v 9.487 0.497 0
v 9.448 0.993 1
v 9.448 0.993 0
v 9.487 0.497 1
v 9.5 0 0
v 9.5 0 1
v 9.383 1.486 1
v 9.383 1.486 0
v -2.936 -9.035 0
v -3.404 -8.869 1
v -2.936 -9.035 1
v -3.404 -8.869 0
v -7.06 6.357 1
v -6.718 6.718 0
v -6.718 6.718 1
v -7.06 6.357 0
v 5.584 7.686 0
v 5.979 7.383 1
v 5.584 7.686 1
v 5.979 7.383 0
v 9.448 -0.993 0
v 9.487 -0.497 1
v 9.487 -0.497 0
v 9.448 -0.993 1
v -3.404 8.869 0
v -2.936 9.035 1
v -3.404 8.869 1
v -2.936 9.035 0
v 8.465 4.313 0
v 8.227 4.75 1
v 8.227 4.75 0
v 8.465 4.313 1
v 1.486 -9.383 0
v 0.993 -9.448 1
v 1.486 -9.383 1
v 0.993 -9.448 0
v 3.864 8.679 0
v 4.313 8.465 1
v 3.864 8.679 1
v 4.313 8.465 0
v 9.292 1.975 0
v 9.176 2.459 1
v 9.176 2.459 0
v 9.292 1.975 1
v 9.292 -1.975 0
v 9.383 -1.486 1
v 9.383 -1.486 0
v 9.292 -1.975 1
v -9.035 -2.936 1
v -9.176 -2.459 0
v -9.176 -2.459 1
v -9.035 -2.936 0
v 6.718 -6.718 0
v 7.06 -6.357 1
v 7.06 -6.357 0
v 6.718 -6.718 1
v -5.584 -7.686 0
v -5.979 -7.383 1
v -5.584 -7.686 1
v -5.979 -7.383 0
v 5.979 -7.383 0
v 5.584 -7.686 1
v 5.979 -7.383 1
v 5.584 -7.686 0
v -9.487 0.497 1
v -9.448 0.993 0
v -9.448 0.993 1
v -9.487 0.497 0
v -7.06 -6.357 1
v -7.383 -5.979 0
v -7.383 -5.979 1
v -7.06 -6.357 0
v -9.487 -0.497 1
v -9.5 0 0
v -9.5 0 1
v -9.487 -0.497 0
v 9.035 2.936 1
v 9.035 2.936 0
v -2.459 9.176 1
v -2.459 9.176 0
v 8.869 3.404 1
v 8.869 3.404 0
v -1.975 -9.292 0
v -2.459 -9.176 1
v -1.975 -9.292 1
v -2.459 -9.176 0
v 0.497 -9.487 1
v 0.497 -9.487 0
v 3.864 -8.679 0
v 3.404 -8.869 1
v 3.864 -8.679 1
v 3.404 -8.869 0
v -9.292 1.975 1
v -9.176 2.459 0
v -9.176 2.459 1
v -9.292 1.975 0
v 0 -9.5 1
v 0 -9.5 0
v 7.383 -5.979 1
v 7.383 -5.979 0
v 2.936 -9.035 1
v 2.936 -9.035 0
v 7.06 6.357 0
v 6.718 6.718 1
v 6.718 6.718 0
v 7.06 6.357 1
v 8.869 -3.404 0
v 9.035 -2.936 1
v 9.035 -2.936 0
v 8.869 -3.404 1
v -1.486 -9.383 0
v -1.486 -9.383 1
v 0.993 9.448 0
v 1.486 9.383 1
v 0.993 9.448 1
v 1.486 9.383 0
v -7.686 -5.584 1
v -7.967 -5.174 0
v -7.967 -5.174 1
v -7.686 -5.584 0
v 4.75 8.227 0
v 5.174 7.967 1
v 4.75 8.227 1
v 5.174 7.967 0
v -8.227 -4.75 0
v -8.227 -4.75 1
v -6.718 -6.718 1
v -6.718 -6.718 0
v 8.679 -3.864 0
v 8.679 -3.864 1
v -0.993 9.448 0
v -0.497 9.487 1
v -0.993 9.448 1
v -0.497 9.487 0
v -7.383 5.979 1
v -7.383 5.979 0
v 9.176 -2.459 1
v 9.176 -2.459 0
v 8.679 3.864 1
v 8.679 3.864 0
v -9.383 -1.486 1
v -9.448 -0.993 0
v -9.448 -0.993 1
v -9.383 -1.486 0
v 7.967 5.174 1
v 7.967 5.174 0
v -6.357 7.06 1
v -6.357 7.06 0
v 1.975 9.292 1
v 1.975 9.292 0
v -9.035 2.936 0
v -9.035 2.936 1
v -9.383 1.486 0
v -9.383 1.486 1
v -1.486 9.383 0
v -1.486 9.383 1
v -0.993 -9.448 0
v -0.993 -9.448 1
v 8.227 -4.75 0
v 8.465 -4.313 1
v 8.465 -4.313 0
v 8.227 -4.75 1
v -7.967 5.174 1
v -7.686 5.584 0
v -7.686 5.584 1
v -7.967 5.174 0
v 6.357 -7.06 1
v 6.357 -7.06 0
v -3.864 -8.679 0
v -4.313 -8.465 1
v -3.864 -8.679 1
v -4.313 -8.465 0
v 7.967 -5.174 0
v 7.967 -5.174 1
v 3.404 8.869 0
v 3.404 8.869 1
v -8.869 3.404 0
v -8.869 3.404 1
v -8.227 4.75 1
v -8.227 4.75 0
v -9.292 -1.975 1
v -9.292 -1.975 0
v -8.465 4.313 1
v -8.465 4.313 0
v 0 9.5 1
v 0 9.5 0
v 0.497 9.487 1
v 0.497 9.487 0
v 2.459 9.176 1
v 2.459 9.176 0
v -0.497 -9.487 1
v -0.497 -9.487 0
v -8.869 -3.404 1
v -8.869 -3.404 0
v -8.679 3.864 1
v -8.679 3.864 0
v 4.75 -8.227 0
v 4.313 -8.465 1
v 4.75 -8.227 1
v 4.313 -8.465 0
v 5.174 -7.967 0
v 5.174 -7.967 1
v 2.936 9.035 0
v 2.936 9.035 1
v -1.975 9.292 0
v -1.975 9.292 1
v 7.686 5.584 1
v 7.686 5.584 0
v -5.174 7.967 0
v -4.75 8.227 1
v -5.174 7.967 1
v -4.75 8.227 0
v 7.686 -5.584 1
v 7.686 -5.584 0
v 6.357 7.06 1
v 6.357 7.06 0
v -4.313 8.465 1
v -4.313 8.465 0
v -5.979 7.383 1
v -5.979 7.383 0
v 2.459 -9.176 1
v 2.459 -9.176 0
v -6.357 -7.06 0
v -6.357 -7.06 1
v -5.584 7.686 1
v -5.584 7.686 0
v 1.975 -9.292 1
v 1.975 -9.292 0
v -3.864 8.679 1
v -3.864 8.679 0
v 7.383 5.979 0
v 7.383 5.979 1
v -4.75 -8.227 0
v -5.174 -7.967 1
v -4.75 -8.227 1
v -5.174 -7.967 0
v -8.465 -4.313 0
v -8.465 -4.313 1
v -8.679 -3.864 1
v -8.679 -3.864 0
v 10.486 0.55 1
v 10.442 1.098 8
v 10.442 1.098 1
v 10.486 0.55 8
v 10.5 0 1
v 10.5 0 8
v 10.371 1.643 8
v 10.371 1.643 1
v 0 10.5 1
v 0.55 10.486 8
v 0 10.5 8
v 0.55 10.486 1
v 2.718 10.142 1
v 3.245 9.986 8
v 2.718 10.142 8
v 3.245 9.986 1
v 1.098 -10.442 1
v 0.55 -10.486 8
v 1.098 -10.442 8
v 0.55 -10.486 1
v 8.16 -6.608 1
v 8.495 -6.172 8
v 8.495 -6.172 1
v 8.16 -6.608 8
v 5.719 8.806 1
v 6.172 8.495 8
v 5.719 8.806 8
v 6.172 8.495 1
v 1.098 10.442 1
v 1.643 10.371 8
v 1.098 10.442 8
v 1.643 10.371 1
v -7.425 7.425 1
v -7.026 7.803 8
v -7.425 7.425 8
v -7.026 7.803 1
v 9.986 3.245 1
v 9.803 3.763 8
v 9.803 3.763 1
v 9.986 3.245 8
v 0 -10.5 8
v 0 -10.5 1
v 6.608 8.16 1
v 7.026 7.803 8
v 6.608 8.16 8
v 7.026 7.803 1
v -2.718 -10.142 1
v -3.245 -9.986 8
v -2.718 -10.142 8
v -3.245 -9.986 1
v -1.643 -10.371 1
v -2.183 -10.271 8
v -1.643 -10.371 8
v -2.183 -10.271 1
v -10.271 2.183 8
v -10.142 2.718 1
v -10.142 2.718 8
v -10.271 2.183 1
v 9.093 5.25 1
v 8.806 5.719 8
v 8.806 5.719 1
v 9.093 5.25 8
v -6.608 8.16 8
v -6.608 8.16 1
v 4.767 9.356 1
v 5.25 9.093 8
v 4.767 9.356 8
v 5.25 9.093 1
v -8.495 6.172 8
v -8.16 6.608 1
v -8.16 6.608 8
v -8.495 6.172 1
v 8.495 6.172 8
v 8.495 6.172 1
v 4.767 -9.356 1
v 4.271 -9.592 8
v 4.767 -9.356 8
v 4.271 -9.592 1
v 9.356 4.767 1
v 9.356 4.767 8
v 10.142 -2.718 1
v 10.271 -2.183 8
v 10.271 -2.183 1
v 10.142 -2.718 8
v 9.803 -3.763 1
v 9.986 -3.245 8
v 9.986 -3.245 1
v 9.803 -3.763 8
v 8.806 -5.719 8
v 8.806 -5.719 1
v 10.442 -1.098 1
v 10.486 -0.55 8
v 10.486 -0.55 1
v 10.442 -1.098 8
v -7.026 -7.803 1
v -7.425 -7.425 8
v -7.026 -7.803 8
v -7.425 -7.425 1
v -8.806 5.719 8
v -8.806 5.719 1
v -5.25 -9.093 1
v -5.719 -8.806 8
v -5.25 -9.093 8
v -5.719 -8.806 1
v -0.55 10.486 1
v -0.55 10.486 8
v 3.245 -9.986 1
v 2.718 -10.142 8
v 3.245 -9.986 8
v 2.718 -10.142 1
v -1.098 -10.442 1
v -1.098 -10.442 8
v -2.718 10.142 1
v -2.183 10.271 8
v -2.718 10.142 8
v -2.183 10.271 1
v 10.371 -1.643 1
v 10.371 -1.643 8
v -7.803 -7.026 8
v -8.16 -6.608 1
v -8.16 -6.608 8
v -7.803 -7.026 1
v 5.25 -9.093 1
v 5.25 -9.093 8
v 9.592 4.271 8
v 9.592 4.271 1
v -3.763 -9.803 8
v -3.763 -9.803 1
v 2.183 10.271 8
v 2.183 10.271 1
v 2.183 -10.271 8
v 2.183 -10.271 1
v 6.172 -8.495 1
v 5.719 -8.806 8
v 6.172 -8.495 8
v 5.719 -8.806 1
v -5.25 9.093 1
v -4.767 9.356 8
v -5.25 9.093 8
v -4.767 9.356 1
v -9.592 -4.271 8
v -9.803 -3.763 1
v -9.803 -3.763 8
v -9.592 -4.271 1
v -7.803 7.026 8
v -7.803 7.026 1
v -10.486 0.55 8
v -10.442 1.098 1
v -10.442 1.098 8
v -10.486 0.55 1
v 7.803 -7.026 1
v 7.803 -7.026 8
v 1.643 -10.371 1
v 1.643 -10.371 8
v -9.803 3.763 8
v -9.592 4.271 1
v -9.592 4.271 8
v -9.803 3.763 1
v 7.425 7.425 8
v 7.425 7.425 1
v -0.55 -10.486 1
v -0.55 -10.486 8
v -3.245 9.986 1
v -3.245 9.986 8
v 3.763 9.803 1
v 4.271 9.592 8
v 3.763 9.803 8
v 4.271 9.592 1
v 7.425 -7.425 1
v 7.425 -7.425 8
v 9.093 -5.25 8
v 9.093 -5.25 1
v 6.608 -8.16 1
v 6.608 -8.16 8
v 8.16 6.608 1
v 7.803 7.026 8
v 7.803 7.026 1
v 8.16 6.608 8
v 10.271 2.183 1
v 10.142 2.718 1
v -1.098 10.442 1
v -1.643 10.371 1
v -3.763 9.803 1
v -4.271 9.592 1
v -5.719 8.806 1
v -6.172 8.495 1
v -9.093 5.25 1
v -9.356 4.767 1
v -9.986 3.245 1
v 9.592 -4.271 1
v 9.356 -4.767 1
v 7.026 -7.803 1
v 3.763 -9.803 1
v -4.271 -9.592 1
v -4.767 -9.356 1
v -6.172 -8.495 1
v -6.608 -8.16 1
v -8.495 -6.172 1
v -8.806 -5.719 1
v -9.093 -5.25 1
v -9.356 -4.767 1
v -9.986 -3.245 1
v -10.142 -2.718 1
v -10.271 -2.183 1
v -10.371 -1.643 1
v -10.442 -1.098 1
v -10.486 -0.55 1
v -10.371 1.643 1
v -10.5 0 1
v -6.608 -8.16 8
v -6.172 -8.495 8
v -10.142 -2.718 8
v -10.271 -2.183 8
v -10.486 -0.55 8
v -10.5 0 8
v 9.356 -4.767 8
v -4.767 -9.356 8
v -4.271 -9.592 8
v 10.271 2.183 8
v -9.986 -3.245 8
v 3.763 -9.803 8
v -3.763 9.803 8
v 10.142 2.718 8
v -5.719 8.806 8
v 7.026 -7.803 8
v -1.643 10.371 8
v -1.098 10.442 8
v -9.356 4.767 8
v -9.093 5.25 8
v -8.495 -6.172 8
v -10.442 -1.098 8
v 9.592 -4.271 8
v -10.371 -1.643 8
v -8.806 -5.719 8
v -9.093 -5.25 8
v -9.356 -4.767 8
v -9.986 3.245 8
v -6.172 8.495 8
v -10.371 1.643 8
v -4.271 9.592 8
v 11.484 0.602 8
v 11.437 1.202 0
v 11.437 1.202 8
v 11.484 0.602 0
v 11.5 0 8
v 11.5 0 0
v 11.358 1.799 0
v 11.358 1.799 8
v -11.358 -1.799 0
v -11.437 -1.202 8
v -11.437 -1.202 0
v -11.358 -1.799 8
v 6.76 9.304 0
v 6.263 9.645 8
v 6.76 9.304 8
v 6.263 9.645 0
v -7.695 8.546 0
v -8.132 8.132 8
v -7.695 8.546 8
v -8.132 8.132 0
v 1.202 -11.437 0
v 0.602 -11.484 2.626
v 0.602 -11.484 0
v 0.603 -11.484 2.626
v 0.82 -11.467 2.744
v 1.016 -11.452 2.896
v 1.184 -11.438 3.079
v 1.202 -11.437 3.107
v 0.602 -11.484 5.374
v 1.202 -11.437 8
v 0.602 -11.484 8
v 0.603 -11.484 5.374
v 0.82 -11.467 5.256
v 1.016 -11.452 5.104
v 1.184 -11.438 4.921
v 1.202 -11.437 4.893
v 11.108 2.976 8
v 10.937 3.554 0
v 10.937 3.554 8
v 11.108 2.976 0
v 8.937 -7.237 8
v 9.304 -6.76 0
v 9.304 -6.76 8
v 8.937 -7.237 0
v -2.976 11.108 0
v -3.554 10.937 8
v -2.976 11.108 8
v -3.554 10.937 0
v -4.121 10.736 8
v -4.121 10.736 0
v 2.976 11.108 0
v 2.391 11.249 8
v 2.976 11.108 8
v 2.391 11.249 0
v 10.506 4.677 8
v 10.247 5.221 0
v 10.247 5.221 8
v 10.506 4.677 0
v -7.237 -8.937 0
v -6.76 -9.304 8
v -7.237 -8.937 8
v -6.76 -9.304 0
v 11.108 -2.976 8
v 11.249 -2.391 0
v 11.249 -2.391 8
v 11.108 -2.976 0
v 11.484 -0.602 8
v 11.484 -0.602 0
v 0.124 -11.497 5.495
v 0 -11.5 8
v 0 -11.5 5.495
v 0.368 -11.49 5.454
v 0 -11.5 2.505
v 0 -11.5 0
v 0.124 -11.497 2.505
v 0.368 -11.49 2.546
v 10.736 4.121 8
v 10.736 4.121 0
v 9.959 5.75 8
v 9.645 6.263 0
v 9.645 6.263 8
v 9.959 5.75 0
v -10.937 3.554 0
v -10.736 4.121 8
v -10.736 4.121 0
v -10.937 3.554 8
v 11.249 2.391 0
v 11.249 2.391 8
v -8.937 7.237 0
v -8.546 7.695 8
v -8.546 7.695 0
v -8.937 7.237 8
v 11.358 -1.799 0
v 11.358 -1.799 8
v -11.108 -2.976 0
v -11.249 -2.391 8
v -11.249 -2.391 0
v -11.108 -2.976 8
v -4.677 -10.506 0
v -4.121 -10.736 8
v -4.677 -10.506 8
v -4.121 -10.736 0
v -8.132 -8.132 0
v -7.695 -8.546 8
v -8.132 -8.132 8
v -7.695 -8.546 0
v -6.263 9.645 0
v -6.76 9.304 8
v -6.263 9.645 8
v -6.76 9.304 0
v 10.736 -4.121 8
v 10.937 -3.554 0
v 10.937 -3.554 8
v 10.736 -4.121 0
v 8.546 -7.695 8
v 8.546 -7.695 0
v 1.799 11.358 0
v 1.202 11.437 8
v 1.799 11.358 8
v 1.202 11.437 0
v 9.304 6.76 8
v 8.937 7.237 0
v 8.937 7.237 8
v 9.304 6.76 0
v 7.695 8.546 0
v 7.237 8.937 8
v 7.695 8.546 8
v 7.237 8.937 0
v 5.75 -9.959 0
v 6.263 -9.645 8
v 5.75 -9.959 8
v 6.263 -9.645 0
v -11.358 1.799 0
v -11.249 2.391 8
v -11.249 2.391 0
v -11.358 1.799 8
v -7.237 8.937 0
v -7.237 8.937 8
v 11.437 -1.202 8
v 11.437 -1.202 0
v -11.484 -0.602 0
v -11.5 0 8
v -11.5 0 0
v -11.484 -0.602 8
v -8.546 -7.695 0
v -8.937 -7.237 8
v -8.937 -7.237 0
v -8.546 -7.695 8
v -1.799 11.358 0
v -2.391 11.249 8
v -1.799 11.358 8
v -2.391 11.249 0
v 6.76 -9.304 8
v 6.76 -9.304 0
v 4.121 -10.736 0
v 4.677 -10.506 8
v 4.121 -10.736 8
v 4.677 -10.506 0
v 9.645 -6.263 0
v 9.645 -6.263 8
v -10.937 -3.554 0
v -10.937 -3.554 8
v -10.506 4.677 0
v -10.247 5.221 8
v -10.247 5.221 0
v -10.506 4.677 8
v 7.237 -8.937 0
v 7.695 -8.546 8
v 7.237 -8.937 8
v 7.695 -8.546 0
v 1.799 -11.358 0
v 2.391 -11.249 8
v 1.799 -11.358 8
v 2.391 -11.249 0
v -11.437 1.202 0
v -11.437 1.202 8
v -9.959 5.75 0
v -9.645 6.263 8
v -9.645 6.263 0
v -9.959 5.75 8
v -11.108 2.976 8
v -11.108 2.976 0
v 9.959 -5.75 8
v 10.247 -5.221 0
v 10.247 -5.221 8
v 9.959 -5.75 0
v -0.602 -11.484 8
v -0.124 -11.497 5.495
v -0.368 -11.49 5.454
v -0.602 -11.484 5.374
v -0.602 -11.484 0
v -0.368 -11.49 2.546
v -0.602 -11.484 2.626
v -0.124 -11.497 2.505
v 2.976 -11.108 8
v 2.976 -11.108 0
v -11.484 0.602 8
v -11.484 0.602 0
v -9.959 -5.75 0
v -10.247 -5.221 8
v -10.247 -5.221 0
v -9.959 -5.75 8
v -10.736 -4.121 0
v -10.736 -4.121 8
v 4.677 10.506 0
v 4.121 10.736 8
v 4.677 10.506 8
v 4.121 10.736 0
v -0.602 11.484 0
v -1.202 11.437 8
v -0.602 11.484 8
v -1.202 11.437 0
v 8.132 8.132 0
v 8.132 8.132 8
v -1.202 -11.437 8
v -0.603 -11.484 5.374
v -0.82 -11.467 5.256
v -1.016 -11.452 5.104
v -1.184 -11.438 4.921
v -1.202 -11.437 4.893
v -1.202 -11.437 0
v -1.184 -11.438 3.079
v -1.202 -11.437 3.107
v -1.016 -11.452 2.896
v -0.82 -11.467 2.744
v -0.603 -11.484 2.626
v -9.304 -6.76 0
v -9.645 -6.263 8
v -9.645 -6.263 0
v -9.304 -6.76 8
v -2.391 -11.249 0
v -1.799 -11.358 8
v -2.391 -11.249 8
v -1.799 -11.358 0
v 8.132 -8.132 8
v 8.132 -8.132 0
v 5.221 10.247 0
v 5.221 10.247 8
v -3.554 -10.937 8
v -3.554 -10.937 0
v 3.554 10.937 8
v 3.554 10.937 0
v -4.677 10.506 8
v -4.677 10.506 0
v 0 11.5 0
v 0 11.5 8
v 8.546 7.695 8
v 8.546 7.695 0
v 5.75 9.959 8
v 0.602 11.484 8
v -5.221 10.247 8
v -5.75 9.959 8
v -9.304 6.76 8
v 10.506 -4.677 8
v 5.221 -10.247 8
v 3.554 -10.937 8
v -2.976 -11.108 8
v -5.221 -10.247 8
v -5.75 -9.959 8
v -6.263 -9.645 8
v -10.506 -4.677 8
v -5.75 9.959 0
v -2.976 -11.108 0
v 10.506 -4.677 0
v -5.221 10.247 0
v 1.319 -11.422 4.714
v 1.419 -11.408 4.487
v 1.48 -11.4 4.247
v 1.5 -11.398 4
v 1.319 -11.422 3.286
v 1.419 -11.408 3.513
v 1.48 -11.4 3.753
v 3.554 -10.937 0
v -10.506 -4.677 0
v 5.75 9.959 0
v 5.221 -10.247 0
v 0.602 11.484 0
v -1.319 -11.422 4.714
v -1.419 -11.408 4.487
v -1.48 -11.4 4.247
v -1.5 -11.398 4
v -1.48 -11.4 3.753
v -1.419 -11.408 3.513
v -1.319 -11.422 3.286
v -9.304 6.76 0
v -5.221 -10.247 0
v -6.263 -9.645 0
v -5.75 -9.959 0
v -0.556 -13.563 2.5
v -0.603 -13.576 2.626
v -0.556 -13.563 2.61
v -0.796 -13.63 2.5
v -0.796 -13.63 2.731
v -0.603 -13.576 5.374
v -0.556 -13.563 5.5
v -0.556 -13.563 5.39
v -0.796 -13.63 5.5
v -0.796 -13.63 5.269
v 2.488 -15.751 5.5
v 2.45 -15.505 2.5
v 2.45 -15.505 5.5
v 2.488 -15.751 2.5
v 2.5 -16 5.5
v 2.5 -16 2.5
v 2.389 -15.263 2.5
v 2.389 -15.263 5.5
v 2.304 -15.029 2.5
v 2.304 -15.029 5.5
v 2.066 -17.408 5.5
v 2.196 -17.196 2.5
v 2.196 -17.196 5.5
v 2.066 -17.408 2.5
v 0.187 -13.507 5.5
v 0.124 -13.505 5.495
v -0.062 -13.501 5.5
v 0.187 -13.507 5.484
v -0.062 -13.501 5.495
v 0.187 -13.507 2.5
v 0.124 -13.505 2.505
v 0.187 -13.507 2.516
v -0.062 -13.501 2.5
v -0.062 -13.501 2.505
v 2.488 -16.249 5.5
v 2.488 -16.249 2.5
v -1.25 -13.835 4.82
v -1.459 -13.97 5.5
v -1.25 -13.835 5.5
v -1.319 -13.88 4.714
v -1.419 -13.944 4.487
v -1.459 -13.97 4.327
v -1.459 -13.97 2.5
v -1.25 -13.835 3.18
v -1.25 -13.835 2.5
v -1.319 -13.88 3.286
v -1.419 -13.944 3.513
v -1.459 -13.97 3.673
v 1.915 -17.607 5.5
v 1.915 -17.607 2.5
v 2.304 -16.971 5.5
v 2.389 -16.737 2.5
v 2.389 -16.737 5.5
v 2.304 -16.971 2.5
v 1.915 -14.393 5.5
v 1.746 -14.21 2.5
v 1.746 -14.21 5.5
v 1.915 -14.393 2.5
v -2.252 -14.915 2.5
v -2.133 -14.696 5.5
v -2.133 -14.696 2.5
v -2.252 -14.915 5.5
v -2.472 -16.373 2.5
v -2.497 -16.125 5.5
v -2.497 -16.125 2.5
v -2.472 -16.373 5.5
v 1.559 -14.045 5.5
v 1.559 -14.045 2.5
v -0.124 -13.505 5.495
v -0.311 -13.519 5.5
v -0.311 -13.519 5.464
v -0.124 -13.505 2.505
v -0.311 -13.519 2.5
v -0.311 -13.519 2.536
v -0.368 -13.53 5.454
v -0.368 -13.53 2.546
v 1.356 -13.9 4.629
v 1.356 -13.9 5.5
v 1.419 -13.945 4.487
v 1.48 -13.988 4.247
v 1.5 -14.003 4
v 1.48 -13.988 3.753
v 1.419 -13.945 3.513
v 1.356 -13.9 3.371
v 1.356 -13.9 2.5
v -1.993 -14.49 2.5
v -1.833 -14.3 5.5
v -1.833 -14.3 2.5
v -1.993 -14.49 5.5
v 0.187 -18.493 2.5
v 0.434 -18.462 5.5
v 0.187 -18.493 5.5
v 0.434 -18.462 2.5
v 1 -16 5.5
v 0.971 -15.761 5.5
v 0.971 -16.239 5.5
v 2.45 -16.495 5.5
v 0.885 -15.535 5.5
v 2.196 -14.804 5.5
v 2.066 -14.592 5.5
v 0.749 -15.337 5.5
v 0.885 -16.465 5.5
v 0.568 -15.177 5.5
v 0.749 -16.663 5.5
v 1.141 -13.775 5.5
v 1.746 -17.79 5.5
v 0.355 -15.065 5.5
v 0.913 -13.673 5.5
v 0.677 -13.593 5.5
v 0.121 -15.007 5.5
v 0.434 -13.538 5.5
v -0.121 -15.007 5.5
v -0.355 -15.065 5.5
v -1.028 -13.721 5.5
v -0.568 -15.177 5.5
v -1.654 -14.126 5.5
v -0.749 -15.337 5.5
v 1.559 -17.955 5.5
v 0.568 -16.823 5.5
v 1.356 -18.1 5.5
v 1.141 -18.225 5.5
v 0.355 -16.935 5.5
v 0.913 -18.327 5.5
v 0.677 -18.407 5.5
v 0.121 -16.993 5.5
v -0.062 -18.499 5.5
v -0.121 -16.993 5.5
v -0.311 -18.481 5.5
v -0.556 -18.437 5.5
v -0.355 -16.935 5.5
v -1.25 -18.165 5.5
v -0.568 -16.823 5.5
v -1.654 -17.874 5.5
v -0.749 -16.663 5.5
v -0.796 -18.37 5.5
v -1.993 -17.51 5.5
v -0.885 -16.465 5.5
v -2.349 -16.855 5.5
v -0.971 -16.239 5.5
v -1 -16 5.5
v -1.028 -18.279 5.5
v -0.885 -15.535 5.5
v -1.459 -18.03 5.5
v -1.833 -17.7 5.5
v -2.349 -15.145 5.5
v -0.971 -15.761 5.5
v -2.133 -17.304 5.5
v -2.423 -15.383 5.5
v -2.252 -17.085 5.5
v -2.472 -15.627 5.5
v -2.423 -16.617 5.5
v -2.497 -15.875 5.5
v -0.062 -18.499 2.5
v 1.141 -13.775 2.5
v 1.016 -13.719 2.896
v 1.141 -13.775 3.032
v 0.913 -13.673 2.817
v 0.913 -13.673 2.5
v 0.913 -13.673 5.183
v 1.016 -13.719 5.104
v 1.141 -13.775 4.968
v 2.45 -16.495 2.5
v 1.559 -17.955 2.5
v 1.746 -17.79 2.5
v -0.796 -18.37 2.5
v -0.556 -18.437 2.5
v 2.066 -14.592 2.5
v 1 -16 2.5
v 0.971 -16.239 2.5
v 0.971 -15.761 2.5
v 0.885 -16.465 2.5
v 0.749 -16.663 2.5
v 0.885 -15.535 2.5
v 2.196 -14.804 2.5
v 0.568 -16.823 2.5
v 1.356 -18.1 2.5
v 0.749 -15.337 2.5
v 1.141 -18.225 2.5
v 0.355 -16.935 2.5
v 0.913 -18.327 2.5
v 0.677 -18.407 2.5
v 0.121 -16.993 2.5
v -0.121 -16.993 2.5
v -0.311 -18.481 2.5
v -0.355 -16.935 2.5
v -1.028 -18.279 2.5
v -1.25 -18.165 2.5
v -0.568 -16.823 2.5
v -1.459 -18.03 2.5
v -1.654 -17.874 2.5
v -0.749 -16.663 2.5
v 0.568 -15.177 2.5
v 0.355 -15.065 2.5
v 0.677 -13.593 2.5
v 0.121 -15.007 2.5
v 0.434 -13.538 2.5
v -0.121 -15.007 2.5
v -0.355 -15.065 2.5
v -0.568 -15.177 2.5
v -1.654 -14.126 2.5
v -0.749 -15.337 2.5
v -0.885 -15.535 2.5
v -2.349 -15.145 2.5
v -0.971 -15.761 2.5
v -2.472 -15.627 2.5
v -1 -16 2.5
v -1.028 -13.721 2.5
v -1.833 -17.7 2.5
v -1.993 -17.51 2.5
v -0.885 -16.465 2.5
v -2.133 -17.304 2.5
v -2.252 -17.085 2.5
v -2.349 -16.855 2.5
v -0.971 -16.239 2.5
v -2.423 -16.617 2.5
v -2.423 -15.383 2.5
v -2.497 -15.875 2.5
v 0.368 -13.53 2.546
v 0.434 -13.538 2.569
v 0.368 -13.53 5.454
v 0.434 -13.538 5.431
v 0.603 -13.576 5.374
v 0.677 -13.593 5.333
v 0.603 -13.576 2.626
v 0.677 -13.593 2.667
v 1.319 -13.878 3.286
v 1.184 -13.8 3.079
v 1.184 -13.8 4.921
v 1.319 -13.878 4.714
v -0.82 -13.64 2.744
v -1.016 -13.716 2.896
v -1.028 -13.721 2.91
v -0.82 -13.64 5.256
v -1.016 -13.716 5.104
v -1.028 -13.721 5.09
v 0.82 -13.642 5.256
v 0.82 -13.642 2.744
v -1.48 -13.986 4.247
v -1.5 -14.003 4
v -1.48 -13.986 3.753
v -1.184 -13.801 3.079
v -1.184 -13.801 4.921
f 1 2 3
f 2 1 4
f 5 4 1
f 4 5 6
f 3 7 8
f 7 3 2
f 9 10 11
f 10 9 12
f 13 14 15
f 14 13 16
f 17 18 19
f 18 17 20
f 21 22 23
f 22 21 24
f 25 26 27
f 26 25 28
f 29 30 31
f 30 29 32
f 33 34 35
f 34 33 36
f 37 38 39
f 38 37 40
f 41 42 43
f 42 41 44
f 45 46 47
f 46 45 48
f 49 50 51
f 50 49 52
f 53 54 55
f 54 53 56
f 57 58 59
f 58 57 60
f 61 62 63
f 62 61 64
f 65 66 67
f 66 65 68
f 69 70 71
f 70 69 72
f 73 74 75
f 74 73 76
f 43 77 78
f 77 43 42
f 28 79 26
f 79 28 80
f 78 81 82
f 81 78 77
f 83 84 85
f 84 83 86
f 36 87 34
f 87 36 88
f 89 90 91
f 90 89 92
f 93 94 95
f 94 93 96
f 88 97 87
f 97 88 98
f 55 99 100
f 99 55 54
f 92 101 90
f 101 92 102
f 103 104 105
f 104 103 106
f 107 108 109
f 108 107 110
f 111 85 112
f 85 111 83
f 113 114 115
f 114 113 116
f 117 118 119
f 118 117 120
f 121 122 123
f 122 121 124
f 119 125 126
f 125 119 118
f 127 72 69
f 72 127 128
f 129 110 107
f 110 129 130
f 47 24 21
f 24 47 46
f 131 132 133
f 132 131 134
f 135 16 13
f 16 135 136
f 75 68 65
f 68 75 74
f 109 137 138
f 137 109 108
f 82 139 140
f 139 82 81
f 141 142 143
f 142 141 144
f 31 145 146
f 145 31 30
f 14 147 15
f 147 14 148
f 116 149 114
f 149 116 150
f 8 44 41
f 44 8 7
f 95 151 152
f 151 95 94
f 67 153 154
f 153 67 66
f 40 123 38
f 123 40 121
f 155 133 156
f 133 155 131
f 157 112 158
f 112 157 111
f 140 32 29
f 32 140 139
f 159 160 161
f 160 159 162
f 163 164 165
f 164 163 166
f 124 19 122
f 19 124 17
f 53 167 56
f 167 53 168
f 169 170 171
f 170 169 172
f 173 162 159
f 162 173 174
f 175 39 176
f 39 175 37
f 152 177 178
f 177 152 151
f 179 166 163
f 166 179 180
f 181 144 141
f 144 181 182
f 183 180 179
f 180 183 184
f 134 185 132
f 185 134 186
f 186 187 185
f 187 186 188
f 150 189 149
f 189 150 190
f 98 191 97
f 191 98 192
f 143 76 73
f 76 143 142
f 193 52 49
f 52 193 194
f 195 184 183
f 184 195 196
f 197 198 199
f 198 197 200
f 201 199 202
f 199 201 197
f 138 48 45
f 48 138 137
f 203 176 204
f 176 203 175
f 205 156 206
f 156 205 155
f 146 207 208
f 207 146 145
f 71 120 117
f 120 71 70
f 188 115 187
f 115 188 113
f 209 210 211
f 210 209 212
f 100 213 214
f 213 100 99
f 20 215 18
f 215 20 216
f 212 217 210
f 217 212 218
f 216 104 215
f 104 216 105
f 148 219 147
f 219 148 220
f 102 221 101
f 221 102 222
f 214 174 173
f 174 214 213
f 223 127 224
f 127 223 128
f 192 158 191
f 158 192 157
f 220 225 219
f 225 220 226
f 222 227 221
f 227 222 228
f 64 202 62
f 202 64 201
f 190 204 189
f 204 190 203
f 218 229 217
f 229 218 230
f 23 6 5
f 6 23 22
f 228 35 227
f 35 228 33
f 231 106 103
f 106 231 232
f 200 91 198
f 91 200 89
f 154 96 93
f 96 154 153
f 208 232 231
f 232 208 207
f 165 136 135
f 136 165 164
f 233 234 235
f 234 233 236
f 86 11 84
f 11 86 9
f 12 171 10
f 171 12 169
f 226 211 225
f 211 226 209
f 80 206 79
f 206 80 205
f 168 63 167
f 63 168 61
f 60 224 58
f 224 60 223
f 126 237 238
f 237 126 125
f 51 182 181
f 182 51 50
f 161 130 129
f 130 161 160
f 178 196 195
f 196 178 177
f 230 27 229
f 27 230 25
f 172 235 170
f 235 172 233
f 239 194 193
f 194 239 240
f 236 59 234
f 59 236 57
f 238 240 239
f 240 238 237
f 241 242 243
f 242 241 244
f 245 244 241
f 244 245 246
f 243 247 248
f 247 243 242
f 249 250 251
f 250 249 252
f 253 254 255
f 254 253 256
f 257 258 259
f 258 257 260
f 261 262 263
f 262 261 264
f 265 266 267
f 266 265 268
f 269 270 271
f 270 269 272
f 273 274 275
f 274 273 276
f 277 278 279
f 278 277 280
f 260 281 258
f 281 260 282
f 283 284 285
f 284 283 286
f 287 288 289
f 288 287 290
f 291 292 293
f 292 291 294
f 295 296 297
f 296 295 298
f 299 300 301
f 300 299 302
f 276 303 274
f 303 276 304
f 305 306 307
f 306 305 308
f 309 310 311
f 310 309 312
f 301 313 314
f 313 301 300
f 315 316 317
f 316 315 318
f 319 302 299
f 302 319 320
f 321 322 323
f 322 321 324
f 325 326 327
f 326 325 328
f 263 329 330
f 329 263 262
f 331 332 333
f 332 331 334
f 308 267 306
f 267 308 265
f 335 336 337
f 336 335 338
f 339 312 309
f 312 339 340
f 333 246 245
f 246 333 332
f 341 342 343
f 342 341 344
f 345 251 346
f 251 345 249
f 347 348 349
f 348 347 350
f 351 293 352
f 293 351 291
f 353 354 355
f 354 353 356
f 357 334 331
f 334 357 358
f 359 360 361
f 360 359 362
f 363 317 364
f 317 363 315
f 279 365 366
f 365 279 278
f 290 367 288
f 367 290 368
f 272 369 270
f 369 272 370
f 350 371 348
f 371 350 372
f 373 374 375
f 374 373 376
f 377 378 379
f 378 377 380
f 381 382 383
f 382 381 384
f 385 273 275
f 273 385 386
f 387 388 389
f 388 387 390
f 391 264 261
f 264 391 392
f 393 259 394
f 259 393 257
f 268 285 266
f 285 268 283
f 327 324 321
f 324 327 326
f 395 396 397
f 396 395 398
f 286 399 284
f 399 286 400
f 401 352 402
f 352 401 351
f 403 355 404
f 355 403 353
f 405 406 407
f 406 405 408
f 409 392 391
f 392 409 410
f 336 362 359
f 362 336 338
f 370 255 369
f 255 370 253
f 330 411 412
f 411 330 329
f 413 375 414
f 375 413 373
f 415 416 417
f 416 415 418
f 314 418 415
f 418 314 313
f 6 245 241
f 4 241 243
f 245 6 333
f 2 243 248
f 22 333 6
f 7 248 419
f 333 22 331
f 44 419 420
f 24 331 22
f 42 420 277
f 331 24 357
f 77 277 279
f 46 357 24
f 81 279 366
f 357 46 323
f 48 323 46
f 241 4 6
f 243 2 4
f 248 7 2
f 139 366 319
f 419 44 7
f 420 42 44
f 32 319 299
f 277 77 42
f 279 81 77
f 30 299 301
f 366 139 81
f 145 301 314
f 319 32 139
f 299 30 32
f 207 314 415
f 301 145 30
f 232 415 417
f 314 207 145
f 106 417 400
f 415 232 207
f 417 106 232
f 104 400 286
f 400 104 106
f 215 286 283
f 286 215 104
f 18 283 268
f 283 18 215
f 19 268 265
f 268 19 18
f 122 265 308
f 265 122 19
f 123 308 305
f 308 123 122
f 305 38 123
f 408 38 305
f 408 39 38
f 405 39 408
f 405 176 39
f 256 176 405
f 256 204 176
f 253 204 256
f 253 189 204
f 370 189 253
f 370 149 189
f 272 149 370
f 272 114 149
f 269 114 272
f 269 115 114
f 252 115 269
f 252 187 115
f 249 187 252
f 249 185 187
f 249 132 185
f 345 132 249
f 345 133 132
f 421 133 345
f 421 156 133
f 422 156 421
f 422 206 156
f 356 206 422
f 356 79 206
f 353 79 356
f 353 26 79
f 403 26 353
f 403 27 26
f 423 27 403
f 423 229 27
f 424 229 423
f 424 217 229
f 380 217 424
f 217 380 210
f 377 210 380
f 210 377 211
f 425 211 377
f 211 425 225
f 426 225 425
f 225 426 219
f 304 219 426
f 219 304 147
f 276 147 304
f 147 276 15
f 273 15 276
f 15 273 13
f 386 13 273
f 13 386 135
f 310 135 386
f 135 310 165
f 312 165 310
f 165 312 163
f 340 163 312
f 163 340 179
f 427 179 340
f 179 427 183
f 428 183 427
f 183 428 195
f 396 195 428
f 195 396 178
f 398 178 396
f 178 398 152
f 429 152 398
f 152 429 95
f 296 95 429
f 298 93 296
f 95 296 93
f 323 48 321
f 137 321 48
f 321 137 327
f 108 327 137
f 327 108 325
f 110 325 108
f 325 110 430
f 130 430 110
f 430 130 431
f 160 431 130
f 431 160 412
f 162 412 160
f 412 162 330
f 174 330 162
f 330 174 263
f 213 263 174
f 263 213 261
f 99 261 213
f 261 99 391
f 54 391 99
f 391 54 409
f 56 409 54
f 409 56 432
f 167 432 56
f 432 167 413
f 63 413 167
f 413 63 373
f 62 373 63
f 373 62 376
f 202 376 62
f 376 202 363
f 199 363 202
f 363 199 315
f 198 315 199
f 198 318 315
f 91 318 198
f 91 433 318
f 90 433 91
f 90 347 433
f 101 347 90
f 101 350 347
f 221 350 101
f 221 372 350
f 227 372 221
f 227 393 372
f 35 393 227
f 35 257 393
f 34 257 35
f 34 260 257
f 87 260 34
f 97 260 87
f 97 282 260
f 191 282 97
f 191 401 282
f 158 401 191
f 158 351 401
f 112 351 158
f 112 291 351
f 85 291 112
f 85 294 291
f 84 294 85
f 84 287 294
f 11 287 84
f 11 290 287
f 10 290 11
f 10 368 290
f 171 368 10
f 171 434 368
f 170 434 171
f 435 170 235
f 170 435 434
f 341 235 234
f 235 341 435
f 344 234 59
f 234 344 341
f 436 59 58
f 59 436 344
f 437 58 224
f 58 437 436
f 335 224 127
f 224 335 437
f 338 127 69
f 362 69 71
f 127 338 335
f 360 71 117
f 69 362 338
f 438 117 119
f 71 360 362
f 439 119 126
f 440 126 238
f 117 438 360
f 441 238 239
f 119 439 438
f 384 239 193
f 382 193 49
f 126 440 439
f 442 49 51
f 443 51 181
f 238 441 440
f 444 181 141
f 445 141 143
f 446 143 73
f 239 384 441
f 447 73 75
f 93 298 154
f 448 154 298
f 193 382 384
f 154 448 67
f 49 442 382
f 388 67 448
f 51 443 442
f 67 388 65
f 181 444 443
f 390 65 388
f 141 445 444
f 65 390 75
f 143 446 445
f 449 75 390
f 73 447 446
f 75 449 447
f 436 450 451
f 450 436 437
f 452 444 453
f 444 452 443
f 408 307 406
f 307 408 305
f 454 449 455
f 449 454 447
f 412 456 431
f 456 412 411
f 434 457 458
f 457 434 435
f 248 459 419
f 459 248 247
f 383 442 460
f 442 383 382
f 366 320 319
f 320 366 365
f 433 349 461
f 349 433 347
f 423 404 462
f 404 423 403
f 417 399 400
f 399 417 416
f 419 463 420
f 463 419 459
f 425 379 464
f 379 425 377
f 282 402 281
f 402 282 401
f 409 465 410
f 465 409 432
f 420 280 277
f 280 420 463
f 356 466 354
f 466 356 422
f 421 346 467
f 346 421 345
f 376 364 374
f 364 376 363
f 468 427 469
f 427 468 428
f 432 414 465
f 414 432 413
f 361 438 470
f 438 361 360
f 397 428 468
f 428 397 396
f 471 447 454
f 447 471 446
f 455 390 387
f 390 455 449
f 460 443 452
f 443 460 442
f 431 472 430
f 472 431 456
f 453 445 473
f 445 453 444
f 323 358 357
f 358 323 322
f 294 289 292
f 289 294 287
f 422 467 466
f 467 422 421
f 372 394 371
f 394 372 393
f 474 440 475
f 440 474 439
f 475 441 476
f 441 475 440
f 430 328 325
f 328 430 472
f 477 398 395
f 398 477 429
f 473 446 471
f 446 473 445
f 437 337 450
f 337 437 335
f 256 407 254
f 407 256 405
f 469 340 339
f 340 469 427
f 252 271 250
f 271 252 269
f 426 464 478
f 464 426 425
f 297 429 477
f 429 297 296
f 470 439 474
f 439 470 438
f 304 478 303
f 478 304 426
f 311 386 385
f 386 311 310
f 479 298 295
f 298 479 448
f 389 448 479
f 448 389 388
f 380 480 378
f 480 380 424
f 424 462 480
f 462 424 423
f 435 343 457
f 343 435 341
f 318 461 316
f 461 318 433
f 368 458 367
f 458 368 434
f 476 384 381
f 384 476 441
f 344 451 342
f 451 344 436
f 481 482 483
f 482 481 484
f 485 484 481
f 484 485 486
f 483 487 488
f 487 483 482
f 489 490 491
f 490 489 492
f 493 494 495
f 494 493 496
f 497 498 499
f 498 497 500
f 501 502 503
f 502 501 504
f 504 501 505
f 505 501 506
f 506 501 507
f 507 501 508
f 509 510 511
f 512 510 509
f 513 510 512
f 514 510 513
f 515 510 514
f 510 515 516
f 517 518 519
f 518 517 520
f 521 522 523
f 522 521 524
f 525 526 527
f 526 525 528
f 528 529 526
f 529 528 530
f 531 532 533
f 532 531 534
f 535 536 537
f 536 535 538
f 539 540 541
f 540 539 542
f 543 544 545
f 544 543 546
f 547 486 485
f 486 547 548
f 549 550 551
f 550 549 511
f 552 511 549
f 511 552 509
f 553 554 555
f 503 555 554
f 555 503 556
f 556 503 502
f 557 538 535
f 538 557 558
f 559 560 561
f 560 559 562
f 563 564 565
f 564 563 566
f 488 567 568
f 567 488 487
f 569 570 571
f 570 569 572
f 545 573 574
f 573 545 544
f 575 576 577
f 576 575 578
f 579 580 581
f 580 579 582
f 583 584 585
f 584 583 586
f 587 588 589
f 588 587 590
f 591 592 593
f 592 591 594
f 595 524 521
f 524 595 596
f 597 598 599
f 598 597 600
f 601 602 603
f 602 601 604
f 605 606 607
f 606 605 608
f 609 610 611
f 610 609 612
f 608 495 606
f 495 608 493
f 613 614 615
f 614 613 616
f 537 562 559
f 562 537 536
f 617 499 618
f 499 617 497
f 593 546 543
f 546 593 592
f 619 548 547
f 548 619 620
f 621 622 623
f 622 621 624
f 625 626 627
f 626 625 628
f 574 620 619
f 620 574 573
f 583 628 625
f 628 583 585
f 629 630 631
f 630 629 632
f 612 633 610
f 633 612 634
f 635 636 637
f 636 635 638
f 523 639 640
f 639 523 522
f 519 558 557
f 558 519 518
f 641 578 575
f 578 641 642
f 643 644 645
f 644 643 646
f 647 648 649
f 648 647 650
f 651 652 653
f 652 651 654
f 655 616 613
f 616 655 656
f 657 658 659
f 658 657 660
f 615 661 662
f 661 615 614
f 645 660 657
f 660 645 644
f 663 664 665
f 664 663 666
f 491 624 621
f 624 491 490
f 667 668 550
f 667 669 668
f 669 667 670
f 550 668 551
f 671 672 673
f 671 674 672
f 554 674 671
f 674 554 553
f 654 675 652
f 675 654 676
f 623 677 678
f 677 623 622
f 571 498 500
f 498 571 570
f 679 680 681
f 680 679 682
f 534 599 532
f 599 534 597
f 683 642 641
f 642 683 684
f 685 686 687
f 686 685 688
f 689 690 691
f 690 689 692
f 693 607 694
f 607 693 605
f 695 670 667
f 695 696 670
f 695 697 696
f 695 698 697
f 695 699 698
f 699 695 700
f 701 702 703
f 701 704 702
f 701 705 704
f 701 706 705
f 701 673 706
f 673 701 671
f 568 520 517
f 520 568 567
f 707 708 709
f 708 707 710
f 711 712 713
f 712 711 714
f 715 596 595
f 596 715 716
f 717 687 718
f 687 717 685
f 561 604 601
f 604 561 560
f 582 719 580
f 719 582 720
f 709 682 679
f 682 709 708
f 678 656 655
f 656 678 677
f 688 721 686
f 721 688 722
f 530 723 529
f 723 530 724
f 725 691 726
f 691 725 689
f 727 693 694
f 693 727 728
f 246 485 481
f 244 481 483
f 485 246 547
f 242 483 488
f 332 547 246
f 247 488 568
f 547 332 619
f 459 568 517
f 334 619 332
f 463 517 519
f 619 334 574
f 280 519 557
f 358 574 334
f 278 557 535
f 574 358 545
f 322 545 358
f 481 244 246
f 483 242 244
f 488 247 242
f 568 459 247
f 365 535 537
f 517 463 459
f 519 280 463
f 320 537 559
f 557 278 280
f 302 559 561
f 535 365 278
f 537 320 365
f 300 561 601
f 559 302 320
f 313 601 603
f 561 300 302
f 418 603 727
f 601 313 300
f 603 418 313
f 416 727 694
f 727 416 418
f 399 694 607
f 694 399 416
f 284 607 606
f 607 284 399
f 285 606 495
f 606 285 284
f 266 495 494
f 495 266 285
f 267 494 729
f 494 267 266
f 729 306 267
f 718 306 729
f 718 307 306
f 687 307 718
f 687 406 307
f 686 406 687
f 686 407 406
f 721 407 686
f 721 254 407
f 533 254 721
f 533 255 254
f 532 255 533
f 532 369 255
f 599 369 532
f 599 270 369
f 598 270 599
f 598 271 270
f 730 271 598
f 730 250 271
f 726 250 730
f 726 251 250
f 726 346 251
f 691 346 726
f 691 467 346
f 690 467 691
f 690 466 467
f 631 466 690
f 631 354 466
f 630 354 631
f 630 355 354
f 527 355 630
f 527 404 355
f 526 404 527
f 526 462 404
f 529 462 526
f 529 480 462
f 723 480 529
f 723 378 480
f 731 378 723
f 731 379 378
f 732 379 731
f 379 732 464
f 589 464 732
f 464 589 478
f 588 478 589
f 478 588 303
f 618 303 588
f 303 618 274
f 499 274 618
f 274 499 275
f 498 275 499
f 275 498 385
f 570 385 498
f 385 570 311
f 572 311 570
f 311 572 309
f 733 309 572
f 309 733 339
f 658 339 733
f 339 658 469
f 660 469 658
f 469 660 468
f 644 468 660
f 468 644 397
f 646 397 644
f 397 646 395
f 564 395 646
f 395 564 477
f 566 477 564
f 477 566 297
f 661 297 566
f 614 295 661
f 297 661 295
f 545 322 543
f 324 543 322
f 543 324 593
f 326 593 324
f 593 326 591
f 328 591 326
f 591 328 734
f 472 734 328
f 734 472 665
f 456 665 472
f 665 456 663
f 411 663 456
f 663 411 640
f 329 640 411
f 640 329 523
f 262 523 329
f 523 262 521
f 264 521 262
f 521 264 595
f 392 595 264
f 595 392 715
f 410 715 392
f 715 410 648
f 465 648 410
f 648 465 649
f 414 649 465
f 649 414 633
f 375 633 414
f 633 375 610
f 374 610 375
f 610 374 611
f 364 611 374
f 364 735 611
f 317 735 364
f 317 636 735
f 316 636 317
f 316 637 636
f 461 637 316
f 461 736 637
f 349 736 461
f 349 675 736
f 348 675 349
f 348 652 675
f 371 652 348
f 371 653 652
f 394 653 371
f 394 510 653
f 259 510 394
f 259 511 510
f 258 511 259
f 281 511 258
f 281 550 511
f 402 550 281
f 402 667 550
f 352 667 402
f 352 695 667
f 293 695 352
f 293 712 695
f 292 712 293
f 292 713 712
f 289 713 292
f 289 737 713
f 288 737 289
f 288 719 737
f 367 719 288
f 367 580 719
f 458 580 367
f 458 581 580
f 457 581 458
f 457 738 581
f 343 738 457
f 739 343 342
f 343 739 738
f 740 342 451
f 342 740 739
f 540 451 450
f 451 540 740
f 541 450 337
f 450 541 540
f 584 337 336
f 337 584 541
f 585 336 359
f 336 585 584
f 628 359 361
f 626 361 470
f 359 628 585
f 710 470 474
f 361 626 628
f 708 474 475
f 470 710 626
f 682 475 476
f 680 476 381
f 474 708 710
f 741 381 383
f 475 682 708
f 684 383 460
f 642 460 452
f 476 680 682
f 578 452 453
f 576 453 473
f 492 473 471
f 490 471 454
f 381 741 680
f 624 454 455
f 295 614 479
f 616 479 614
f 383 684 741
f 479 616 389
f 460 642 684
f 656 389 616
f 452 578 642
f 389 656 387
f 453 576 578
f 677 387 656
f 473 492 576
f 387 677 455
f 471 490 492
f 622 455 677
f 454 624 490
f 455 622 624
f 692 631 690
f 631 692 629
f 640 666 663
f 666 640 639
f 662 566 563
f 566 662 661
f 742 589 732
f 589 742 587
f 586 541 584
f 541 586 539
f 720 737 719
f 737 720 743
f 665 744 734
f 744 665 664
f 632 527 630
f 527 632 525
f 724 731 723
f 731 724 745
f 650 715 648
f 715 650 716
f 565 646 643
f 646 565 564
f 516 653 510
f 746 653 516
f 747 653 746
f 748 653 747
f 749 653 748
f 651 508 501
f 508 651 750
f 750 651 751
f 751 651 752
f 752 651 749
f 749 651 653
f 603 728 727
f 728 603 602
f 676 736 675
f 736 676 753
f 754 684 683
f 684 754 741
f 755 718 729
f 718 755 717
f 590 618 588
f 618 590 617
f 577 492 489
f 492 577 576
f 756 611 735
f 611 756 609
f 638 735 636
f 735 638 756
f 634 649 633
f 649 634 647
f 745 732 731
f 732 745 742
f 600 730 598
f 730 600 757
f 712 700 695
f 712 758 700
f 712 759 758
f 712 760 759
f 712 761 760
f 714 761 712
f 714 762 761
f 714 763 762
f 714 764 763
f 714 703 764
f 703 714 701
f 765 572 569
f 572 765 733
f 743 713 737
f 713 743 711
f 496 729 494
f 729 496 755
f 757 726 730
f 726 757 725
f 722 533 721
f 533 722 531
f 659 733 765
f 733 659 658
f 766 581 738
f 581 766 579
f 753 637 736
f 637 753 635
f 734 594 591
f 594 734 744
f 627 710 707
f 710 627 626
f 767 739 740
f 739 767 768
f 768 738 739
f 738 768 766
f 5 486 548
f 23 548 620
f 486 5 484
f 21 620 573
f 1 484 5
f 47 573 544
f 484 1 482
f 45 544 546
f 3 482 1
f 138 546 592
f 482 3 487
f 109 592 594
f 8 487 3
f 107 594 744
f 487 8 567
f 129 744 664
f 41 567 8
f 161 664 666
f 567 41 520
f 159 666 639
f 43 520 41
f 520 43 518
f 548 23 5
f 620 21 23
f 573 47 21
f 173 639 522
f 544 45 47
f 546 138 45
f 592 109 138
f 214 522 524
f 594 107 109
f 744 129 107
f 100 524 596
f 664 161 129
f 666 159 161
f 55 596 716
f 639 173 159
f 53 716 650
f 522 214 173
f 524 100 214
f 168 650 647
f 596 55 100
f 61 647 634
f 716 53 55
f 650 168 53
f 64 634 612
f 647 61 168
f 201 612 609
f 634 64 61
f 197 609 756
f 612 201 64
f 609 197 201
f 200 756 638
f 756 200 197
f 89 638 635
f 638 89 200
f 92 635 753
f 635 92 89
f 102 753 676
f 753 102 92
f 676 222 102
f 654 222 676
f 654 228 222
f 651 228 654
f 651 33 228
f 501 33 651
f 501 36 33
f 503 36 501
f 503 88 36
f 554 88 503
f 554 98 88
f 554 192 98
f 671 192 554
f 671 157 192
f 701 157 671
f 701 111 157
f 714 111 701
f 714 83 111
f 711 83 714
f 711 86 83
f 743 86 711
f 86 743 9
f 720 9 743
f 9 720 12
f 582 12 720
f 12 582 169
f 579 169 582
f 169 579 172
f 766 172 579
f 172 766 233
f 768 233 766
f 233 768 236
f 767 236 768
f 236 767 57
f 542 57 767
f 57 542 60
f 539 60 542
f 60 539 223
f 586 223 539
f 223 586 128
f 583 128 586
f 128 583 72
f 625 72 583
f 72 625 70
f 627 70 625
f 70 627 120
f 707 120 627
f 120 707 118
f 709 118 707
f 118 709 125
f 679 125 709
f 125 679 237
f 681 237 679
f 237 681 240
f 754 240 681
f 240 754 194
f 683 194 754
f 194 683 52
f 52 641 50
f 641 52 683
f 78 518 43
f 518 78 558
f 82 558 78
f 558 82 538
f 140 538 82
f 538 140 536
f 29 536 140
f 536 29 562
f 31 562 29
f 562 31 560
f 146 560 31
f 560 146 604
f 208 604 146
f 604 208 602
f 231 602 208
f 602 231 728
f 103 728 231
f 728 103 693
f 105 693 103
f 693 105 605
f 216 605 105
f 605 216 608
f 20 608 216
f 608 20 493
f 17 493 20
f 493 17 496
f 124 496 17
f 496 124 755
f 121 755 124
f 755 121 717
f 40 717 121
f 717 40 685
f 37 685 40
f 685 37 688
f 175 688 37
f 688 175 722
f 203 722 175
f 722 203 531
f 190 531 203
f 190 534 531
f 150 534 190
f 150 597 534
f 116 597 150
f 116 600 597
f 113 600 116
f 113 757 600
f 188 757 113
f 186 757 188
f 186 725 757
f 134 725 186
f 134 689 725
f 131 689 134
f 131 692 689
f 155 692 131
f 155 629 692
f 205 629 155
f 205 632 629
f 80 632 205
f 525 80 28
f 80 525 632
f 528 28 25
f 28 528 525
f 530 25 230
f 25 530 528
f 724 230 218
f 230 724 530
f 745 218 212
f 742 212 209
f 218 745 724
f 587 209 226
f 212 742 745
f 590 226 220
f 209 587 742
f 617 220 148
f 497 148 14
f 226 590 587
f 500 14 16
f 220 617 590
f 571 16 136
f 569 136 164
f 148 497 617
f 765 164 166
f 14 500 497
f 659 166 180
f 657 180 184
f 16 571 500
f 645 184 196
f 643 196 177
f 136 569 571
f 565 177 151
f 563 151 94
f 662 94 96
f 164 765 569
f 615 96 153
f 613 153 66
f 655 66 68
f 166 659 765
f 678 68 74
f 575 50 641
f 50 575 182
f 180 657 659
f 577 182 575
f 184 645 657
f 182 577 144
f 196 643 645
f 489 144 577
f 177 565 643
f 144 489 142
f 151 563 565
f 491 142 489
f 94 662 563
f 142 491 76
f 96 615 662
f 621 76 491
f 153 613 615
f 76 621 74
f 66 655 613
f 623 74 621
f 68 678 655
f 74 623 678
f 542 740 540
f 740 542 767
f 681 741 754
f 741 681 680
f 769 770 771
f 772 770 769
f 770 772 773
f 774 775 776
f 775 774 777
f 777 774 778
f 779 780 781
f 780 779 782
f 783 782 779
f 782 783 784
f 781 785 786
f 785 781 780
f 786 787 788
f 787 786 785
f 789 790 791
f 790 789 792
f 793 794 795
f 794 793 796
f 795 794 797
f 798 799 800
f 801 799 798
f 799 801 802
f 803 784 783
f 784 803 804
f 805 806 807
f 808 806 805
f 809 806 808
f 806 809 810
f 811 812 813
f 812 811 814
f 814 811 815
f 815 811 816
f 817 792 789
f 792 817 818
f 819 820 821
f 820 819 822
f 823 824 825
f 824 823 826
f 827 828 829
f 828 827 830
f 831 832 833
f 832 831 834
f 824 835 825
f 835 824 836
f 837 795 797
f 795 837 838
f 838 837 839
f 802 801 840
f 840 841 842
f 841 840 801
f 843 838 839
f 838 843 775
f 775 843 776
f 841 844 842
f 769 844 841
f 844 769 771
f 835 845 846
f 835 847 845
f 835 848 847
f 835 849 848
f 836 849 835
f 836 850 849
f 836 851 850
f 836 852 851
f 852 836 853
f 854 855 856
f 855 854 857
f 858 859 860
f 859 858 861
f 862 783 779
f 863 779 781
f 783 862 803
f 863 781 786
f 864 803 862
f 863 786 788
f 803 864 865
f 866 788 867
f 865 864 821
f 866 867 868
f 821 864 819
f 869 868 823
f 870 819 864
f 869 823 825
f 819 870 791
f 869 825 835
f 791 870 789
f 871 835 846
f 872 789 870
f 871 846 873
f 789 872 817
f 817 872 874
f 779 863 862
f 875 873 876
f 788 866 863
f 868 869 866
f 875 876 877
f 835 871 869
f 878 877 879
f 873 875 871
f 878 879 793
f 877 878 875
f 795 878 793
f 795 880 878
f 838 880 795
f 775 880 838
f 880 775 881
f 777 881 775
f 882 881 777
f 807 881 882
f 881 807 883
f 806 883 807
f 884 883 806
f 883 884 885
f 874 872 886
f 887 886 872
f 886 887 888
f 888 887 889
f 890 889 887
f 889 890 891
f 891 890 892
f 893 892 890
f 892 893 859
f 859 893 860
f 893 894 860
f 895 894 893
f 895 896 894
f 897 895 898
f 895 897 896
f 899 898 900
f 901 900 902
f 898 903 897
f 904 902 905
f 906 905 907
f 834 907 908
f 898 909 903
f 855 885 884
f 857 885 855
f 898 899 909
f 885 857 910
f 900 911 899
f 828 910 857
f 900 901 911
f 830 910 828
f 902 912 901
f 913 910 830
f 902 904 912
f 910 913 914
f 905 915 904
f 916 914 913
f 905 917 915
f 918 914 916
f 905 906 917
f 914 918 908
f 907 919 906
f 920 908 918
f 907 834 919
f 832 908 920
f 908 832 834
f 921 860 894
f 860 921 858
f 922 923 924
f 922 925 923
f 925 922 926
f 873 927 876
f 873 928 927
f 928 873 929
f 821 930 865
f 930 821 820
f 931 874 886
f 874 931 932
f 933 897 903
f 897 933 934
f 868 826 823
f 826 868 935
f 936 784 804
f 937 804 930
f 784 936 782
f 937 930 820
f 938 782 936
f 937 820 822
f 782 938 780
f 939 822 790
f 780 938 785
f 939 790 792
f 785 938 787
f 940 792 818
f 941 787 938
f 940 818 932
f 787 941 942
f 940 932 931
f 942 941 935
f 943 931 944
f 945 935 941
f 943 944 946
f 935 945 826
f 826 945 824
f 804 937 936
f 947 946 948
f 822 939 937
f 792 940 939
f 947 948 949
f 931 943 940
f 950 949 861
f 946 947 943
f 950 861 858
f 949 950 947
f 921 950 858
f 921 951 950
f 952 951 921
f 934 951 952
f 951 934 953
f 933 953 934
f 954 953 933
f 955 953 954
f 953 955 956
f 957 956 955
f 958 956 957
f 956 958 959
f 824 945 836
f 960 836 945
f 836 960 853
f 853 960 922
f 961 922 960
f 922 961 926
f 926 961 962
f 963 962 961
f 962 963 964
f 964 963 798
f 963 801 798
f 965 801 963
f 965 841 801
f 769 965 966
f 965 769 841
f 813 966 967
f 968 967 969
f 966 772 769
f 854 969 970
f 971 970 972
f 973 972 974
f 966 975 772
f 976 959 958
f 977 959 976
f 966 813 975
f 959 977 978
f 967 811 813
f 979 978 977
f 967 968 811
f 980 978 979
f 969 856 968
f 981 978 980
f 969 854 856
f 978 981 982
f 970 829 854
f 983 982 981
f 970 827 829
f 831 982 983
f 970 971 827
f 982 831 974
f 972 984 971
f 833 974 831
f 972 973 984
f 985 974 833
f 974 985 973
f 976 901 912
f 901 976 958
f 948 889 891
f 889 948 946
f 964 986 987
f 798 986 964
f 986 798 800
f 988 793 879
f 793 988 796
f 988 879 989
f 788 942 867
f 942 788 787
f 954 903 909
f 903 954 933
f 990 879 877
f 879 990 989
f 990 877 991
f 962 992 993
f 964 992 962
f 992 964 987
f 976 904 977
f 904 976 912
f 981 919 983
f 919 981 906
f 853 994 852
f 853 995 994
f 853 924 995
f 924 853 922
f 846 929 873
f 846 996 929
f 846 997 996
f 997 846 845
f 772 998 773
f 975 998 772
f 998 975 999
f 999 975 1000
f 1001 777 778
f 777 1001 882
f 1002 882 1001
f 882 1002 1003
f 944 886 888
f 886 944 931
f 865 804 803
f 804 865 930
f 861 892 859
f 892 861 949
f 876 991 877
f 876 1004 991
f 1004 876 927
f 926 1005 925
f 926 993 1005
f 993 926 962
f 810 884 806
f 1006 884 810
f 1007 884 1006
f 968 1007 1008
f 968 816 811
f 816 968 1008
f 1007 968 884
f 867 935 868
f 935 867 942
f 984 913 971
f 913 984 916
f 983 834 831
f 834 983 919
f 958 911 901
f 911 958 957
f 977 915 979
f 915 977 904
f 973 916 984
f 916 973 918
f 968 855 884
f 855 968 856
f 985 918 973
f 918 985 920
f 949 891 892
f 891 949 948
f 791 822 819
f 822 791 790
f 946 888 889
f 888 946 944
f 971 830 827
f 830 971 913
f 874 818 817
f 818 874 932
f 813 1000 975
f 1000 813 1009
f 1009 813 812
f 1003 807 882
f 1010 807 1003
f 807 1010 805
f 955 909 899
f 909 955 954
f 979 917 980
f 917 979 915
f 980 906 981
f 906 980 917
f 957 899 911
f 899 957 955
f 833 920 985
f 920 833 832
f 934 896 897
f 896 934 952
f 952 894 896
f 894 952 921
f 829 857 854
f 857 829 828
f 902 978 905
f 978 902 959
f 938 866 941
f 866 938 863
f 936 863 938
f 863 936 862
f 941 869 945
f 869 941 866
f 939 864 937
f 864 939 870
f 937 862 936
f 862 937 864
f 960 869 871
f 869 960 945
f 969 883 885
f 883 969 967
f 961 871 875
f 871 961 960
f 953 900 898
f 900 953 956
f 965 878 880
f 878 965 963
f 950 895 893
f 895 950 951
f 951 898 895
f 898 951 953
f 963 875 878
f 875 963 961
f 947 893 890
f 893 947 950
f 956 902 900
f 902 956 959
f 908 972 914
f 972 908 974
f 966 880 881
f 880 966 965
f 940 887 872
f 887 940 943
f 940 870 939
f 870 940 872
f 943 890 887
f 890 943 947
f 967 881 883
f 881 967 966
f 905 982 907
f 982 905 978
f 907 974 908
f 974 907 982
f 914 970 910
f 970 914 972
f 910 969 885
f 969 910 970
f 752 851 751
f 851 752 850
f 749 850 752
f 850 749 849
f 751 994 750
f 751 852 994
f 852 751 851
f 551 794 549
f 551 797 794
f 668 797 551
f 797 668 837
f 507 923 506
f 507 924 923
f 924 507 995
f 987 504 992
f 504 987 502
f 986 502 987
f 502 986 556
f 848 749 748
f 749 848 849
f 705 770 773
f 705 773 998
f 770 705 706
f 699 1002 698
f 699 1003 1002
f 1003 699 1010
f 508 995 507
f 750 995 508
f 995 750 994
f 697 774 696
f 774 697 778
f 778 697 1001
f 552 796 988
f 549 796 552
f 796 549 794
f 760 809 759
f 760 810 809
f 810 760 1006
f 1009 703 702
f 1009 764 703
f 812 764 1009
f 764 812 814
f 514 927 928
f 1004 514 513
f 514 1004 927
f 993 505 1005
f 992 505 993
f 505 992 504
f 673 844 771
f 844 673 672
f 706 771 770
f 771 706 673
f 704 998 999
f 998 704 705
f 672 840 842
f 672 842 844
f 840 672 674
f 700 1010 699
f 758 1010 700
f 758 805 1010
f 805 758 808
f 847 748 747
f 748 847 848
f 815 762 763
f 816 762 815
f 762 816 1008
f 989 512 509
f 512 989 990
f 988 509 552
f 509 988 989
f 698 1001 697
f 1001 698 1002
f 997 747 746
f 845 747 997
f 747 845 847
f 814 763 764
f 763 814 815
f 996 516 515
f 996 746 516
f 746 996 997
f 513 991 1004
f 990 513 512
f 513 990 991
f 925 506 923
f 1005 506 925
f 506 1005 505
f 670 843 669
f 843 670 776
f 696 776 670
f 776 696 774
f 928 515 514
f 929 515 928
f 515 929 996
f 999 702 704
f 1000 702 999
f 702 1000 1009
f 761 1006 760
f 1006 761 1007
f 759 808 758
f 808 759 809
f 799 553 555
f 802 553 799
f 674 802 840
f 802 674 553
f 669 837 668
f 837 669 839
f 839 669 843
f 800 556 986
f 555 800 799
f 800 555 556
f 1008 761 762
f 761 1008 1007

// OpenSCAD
$fs=0.25;
$fa=3;

difference() {
  cylinder( 8, d=23 );
  union(){
    translate([0,0,-1]) cylinder( 12, d=19 );
    translate([0,0,1]) cylinder( 10, d=21 );
  }
}



translate([0,-15,4]) rotate([-90,0,0]){
  cylinder( 4, d=3 );
  translate([0,1.5,-1]) rotate([90,0,0]) difference() {
    cylinder( 3, d=5 );
    translate([0,0,-1]) cylinder( 5, d=2 );
  }
}
